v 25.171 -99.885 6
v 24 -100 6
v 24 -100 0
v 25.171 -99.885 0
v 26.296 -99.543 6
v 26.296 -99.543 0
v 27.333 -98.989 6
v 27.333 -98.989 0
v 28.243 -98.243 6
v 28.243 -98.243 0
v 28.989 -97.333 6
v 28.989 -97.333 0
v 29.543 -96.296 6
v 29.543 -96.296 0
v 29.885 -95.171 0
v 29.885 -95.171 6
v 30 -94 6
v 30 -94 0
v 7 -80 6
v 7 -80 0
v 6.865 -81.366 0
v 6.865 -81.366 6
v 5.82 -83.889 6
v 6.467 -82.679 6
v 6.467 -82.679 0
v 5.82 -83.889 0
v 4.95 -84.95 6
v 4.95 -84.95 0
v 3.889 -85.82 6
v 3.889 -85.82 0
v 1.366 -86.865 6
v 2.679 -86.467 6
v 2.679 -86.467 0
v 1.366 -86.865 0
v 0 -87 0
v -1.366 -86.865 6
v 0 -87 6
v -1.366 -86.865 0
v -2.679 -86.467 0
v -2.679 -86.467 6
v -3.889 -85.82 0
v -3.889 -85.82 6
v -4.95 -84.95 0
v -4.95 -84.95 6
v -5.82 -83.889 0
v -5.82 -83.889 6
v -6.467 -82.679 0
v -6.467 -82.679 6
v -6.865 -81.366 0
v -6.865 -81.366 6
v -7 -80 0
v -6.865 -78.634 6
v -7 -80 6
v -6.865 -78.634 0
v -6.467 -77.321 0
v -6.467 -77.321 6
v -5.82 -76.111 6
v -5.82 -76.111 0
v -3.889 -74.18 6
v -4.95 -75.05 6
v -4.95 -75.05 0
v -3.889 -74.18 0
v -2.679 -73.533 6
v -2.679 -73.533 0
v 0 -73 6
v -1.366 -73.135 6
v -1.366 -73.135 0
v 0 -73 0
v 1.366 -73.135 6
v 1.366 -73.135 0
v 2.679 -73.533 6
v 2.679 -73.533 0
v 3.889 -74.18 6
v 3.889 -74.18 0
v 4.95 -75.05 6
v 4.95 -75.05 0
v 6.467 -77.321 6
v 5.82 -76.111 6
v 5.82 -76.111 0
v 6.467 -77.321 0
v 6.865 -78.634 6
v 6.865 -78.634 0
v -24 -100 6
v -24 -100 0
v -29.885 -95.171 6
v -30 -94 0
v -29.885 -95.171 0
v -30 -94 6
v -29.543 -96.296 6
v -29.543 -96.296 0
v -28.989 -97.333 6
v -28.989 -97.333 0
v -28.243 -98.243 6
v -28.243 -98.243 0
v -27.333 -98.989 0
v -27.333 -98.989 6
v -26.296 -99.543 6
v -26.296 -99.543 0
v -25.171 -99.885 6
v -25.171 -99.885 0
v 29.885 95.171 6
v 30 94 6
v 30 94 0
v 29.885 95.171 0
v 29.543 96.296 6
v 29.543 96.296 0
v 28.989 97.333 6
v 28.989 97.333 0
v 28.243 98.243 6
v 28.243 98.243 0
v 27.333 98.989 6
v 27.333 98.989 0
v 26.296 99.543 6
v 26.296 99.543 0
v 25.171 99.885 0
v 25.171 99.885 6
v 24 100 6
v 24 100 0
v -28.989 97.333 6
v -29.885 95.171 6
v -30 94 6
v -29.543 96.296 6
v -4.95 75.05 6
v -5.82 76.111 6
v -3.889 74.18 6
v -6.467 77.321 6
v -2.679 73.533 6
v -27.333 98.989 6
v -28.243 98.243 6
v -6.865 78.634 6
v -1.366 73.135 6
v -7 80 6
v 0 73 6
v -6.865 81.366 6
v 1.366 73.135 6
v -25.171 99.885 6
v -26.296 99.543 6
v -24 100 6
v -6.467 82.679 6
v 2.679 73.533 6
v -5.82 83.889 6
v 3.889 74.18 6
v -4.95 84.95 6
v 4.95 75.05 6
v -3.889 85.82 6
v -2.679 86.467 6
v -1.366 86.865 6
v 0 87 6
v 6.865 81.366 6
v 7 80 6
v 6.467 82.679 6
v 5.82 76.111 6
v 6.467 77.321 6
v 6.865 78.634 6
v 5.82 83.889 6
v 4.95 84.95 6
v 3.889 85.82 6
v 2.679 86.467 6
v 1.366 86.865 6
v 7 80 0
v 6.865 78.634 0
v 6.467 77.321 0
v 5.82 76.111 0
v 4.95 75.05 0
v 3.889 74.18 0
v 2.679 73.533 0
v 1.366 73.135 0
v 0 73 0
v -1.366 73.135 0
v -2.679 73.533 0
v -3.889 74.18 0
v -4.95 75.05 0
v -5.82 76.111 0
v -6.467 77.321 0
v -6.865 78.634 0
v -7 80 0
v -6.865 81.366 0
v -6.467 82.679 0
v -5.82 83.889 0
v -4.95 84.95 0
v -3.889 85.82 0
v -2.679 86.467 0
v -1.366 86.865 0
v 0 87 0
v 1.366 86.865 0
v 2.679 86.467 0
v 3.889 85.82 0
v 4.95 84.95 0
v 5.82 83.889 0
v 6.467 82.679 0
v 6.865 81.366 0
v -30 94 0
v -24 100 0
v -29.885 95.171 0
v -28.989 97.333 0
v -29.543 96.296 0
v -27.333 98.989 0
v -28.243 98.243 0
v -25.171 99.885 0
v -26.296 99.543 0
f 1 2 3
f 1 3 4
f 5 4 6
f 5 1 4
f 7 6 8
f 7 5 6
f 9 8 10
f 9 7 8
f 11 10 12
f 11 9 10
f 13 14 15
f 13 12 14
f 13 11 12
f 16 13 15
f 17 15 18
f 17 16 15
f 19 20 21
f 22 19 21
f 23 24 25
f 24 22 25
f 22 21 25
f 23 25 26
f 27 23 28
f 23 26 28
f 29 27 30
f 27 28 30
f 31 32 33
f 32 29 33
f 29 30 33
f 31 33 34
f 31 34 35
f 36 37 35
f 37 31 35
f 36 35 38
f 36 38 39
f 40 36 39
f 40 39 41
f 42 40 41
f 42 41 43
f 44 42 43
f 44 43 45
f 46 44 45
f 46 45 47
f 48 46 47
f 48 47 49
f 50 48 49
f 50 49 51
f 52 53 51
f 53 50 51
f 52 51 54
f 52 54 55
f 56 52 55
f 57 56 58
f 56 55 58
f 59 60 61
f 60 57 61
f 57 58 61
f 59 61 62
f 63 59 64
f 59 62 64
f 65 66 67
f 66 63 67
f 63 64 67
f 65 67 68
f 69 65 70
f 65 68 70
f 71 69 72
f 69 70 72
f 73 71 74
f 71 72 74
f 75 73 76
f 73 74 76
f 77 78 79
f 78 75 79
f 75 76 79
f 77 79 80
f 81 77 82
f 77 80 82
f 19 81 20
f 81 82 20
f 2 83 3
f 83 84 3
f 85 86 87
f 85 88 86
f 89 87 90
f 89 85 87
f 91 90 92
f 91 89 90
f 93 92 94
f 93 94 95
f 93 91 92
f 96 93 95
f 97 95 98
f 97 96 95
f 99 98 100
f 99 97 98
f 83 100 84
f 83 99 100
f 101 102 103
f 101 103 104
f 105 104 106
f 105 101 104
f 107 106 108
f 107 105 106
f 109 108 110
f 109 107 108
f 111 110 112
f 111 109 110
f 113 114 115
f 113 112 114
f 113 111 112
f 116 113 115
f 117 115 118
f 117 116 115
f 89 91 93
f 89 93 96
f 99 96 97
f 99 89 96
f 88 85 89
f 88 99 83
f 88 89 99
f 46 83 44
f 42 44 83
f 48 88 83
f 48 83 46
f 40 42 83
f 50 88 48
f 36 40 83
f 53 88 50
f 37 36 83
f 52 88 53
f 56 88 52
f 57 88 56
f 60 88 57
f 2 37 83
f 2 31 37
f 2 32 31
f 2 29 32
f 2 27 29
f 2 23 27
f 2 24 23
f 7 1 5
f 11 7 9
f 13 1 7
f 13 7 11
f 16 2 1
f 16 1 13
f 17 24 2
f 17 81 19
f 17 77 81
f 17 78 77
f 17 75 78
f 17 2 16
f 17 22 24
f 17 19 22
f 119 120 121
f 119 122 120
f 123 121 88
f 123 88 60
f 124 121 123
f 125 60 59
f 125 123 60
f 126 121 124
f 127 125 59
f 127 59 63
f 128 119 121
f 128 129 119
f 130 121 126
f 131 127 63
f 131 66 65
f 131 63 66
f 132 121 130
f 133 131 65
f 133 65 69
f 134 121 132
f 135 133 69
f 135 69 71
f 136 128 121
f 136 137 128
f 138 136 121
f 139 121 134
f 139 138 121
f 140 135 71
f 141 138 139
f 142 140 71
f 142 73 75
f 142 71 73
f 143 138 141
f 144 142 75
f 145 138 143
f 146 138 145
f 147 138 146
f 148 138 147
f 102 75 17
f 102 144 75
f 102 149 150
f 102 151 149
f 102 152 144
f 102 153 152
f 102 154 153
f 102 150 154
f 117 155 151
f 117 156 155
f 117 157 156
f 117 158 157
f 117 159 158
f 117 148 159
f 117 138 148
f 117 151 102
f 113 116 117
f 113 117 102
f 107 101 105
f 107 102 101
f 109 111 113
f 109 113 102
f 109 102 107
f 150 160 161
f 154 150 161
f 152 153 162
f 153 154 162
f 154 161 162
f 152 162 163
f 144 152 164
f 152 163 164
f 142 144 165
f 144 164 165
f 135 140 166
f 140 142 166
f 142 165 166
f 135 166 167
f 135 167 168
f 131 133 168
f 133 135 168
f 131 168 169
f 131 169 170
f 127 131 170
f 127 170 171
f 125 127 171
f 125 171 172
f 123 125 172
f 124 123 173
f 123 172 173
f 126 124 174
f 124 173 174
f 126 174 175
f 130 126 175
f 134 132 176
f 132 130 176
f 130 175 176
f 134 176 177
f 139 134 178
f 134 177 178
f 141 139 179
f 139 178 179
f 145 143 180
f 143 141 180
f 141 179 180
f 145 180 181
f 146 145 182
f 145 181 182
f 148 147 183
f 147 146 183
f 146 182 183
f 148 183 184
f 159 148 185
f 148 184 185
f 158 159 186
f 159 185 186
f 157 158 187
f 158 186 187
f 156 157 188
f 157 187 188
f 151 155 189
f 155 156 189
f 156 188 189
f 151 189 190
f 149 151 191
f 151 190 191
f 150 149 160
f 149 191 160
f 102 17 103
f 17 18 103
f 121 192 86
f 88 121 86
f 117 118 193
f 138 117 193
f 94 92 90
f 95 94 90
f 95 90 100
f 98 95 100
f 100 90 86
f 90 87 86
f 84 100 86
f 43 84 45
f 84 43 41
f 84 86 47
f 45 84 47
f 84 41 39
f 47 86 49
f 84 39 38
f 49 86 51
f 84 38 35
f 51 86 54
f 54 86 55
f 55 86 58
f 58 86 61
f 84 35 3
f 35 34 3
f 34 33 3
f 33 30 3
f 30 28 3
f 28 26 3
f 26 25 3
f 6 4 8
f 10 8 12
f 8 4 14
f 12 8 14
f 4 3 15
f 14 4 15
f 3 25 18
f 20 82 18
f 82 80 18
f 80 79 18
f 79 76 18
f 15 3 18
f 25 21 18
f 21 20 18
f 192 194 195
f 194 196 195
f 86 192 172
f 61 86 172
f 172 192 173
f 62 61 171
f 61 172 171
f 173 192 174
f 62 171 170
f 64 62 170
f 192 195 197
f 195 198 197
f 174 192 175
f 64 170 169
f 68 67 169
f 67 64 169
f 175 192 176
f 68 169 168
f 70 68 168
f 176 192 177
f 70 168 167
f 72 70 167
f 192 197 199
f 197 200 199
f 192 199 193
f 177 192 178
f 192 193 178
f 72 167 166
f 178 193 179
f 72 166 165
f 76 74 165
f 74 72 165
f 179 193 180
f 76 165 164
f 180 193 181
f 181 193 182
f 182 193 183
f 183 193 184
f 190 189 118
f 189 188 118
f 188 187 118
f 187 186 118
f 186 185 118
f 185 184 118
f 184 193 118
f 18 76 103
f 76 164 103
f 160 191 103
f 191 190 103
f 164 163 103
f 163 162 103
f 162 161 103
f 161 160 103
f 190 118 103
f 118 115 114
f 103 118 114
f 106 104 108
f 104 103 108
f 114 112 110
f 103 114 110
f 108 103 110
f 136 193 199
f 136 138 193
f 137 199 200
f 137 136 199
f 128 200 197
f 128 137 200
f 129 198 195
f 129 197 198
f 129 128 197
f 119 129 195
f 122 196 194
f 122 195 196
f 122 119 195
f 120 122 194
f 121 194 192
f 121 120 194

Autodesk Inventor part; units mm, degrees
ref_plane "YZ Plane" through (0, 0, 0) normal (1, 0, 0) x (0, 1, 0)
ref_plane "XZ Plane" through (0, 0, 0) normal (0, 1, 0) x (-1, 0, 0)
ref_plane "XY Plane" through (0, 0, 0) normal (0, 0, 1) x (1, 0, 0)
sketch "Sketch1" plane through (0, 0, 0) normal (0, 0, 1) x (1, 0, 0)
  line L0 (-30, -100) -> (30, -100)
  line L1 (30, -100) -> (30, 100)
  line L2 (30, 100) -> (-30, 100)
  line L3 (-30, 100) -> (-30, -100)
  line L4 (-30, -100) -> (30, 100) construction
  line L5 (30, -100) -> (-30, 100) construction
  circle A0 centre (0, 80) radius 7
  circle A1 centre (0, -80) radius 7
  line L6 (0, 100) -> (0, -100) construction
  line L7 (-30, 0) -> (30, 0) construction
  point P0 (0, 0)
  point P1 (0, 0)
  dimension "d154" = 60
  dimension "d155" = 200
  dimension "d157" = 20
  dimension "d159" = 14
extrude "Plate5" add sketch "Sketch1" along normal blind 6
fillet "Corner Round1" radius 6 4 edges at (-30, 100, 3) (30, 100, 3) (30, -100, 3) (-30, -100, 3)
